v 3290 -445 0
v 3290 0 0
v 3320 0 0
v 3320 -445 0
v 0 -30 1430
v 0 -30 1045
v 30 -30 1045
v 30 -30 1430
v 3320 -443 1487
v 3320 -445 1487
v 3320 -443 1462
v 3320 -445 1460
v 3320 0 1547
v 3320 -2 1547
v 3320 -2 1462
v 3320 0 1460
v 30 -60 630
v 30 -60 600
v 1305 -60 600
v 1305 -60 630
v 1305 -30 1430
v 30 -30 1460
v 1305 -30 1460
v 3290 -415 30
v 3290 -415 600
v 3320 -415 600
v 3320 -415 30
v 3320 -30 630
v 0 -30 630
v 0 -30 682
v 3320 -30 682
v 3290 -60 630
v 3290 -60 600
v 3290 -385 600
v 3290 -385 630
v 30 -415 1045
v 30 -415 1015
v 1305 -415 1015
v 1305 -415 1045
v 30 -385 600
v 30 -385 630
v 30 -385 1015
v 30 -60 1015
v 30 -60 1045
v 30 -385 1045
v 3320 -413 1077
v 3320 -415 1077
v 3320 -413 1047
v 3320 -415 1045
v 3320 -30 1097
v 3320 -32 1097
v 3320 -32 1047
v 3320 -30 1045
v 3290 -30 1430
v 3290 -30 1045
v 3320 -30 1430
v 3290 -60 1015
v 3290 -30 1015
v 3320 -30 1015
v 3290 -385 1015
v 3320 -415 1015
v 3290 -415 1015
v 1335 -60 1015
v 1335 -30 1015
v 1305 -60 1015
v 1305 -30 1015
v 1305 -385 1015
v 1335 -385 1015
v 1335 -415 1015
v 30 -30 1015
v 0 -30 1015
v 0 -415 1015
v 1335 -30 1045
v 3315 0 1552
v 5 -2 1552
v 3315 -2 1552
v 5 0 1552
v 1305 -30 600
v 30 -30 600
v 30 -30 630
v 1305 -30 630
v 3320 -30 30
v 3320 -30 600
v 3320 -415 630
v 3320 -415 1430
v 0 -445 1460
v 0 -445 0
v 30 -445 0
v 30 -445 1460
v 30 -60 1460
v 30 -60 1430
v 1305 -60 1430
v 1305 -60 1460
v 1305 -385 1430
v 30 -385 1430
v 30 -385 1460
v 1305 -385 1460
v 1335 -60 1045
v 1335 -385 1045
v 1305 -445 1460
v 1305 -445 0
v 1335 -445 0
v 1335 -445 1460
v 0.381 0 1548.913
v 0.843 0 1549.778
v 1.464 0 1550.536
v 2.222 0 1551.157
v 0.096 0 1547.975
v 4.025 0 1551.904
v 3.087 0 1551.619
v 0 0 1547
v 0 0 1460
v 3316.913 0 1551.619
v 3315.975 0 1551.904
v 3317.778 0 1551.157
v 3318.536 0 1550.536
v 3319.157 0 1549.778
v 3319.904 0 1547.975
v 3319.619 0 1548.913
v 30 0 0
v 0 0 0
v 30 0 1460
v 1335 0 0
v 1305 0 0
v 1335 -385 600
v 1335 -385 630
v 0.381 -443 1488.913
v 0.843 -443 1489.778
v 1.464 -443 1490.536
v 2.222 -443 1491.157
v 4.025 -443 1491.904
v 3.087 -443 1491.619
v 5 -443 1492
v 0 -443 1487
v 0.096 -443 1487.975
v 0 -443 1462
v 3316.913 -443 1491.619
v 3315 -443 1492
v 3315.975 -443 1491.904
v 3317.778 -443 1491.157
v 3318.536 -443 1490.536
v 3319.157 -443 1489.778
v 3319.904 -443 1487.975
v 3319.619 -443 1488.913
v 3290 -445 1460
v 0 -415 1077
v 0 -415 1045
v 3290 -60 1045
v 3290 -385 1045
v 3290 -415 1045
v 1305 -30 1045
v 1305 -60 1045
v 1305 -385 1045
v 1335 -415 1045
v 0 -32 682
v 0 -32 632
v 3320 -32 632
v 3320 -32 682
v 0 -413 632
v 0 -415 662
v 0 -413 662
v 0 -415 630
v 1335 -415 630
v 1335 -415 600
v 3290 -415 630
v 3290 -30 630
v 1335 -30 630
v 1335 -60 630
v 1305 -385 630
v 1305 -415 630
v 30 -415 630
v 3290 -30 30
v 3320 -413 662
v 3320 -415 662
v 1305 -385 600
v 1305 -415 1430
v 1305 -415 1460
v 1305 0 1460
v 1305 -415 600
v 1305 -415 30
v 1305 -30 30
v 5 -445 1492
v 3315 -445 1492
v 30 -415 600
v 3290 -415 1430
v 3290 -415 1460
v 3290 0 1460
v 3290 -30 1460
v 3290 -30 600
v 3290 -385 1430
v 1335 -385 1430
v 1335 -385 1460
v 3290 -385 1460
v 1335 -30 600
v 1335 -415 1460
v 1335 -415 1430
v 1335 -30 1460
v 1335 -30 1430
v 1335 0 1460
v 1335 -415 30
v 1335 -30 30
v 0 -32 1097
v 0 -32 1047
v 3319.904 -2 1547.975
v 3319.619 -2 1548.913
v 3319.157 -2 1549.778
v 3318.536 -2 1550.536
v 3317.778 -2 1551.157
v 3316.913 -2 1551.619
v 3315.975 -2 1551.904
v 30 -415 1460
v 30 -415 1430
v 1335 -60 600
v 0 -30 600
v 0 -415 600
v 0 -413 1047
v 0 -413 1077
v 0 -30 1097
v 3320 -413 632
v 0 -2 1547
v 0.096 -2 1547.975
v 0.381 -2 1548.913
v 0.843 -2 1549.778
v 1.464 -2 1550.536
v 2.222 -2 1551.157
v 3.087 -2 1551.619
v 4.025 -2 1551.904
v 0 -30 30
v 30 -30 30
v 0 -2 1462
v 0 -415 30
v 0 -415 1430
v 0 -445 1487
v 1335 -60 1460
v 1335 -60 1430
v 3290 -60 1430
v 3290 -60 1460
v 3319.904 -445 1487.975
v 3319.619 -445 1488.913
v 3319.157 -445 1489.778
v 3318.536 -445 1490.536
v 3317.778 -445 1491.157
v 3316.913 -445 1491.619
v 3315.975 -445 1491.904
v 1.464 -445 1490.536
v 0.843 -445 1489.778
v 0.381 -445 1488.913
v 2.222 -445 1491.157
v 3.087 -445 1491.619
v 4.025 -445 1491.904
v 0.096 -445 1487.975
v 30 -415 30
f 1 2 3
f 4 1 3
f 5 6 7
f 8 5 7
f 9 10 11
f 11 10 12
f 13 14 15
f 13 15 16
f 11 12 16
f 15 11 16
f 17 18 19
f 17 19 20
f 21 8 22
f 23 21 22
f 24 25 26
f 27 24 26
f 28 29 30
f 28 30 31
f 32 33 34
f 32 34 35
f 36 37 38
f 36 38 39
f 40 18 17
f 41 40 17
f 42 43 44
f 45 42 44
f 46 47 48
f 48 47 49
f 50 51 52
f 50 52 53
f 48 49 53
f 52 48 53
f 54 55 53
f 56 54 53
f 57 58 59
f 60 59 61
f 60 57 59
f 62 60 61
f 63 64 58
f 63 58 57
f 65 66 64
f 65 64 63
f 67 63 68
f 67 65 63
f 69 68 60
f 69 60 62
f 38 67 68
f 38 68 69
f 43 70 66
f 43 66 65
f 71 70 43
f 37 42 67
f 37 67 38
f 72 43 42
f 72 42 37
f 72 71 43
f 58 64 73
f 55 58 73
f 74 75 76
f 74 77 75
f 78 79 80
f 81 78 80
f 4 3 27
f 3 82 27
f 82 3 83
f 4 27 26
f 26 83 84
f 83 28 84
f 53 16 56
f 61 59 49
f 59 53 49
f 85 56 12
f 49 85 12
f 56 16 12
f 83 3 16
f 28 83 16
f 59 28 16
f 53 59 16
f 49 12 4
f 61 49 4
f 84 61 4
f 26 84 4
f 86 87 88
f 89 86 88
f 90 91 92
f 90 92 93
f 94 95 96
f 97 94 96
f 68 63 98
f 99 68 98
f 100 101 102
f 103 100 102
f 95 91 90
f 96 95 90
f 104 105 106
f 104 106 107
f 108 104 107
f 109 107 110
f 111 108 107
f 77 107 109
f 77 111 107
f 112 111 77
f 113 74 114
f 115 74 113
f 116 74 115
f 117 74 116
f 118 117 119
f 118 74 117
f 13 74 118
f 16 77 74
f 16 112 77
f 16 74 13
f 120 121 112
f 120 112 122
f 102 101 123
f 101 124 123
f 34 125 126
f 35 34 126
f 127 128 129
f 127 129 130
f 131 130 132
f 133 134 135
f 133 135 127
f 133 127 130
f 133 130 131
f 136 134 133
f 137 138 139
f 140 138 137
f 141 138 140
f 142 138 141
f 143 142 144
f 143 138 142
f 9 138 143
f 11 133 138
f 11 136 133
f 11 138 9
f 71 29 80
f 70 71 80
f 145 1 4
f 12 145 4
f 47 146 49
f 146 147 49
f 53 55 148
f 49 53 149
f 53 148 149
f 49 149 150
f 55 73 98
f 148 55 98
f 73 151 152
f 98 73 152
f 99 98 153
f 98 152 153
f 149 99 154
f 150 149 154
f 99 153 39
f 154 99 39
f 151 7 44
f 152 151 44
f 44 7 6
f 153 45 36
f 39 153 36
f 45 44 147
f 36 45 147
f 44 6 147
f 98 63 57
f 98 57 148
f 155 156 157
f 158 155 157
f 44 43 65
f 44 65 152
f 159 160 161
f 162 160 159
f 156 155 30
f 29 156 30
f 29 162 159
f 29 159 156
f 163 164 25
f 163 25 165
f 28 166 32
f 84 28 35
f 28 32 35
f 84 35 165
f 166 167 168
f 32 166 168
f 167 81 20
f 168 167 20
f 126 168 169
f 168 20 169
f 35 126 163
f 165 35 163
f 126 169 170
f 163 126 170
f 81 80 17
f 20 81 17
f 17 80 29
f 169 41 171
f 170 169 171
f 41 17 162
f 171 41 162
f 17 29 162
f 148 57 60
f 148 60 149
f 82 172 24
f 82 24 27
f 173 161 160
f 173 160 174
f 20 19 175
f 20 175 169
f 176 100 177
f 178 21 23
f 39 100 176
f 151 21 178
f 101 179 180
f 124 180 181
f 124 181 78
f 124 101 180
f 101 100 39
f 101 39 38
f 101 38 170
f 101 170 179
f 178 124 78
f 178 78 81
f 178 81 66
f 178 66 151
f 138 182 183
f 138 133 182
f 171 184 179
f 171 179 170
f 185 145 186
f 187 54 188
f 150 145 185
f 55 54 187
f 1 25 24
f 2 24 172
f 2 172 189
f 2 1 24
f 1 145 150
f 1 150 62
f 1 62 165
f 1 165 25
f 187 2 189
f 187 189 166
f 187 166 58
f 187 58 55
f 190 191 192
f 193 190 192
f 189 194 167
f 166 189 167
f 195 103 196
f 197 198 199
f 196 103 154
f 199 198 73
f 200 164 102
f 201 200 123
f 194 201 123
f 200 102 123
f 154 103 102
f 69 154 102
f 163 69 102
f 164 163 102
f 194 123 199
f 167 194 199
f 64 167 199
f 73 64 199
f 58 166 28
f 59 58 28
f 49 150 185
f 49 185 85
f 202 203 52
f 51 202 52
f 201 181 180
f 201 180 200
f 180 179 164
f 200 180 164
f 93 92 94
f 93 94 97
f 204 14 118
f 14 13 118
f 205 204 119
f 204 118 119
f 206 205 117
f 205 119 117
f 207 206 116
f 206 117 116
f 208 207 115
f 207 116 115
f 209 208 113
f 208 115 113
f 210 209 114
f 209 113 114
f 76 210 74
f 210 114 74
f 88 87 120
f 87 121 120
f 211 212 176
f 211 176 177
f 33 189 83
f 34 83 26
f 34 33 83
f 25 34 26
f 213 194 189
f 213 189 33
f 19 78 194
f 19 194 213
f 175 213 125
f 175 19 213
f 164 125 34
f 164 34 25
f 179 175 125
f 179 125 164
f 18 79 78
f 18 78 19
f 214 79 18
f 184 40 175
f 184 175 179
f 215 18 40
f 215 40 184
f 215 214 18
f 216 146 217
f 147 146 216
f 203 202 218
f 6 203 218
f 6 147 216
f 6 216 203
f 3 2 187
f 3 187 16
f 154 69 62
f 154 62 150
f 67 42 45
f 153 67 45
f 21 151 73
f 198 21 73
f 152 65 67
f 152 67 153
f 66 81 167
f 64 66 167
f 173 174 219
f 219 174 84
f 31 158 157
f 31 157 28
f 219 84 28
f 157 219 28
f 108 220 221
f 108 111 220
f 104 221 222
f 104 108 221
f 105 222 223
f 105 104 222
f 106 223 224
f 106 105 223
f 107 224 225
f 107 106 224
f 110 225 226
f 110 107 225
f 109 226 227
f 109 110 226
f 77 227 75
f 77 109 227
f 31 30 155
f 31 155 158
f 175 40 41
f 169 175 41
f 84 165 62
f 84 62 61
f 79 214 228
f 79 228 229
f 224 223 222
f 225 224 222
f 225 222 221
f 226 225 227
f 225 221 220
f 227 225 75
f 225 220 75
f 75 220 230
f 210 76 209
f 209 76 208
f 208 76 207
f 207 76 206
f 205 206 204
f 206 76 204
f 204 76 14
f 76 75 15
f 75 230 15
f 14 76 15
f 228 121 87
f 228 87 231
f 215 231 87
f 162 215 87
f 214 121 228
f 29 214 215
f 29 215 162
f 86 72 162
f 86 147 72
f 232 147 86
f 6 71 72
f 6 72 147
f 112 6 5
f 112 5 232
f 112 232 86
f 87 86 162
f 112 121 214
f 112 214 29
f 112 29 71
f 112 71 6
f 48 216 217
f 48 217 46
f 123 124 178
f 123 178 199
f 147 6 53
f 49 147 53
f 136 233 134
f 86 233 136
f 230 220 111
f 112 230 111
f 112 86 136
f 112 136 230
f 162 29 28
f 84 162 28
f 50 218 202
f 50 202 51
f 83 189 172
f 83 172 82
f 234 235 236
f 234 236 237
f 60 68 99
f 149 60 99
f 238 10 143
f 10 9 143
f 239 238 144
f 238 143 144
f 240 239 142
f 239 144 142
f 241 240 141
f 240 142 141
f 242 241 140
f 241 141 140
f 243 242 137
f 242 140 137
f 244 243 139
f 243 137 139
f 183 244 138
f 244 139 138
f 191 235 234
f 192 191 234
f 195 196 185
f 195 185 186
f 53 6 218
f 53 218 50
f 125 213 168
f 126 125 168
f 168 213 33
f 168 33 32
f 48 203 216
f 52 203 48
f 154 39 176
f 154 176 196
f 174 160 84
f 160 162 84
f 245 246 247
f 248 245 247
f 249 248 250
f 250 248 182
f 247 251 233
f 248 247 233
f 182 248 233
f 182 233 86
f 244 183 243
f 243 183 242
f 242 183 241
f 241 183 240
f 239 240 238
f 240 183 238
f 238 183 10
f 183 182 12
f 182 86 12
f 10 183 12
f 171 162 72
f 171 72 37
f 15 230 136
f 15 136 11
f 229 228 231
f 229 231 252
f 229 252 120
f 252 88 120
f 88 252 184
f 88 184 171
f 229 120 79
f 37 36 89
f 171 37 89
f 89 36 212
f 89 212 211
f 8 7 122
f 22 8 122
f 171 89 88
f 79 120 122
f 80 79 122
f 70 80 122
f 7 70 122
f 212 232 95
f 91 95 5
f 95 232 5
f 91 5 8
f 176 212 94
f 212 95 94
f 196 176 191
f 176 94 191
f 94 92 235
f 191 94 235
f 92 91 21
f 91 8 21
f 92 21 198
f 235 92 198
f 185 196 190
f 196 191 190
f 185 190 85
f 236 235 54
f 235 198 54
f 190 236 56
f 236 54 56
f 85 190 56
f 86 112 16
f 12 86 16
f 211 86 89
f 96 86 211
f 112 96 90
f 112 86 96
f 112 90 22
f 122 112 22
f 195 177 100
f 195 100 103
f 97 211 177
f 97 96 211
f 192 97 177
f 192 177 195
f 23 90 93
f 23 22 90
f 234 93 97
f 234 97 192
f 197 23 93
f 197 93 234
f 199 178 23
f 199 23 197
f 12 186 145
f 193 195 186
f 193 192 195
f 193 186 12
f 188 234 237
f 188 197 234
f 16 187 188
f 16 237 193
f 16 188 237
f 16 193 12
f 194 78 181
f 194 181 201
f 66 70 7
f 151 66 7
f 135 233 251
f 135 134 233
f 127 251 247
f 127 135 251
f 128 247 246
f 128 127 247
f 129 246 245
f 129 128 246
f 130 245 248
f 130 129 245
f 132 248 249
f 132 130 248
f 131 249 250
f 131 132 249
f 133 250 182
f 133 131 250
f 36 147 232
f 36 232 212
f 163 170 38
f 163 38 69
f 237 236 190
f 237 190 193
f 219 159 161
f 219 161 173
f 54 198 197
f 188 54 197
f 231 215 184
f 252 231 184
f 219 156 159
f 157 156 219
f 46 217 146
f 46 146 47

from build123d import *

# Parameters (mm, degrees)
F0_W      = 30
F0_H      = 30
F1_DEPTH  = 1460
F2_W      = 30
F2_H      = 30
F3_DEPTH  = 3320
F4_W      = 30
F4_H      = 30
F5_DEPTH  = 325
F6_W      = 3320
F6_H      = 445
F7_DEPTH  = 2
F8_W      = 3320
F8_H      = 2
F9_DEPTH  = 30
F10_DEPTH = 90
F11_W     = 3320
F11_H     = 385
F12_DEPTH = 2
F13_W     = 3320
F13_H     = 385
F14_DEPTH = 2
F15_W     = 3320
F15_H     = 2
F16_DEPTH = 30
F17_W     = 3320
F17_H     = 2
F18_DEPTH = 30
F19_R     = 5
F20_W     = 30
F20_H     = 30
F21_DEPTH = 385
F22_DEPTH = 50
F23_DEPTH = 50


with BuildPart() as f1:
    # F0 (on Top) → F1 (new body)
    with BuildSketch(Plane.XY):
        with Locations((15, -15)):
            Rectangle(F0_W, F0_H)
    extrude(amount=F1_DEPTH)



with BuildPart() as f1b:
    # F0 (on Top) → F1, piece 2 (new body)
    with BuildSketch(Plane.XY):
        with Locations((1320, -15)):
            Rectangle(F0_W, F0_H)
    extrude(amount=F1_DEPTH)


with BuildPart() as f1c:
    # F0 (on Top) → F1, piece 3 (new body)
    with BuildSketch(Plane.XY):
        with Locations((3305, -15)):
            Rectangle(F0_W, F0_H)
    extrude(amount=F1_DEPTH)


with BuildPart() as f1d:
    # F0 (on Top) → F1, piece 4 (new body)
    with BuildSketch(Plane.XY):
        with Locations((15, -430)):
            Rectangle(F0_W, F0_H)
    extrude(amount=F1_DEPTH)



with BuildPart() as f1e:
    # F0 (on Top) → F1, piece 5 (new body)
    with BuildSketch(Plane.XY):
        with Locations((1320, -430)):
            Rectangle(F0_W, F0_H)
    extrude(amount=F1_DEPTH)


with BuildPart() as f1f:
    # F0 (on Top) → F1, piece 6 (new body)
    with BuildSketch(Plane.XY):
        with Locations((3305, -430)):
            Rectangle(F0_W, F0_H)
    extrude(amount=F1_DEPTH)


with BuildPart() as f1_1:
    add(f1.part)

    add(f1b.part)  # F3 merges F1b

    add(f1c.part)  # F3 merges F1c
    # F2 (on face) → F3 (join)
    with BuildSketch(Plane(origin=(0, 0, 0), x_dir=(0, -1, 0), z_dir=(-1, 0, 0))):
        with Locations((45, 1445)):
            Rectangle(F2_W, F2_H)
        with Locations((45, 1030)):
            Rectangle(F2_W, F2_H)
        with Locations((45, 615)):
            Rectangle(F2_W, F2_H)
    extrude(amount=-F3_DEPTH)



with BuildPart() as f1d_1:
    add(f1d.part)

    add(f1e.part)  # F3#2 merges F1e

    add(f1f.part)  # F3#2 merges F1f
    # F2 (on face) → F3, piece 2 (join)
    with BuildSketch(Plane(origin=(0, 0, 0), x_dir=(0, -1, 0), z_dir=(-1, 0, 0))):
        with Locations((400, 1445)):
            Rectangle(F2_W, F2_H)
        with Locations((400, 1030)):
            Rectangle(F2_W, F2_H)
        with Locations((400, 615)):
            Rectangle(F2_W, F2_H)
    extrude(amount=-F3_DEPTH)


with BuildPart() as f1_2:
    add(f1_1.part)

    add(f1d_1.part)  # F5 merges F1d
    # F4 (on face) → F5 (join, through all)
    with BuildSketch(Plane.XZ.offset(60)):
        with Locations((15, 1445)):
            Rectangle(F4_W, F4_H)
        with Locations((1320, 1445)):
            Rectangle(F4_W, F4_H)
        with Locations((3305, 1445)):
            Rectangle(F4_W, F4_H)
        with Locations((15, 1030)):
            Rectangle(F4_W, F4_H)
        with Locations((3305, 1030)):
            Rectangle(F4_W, F4_H)
        with Locations((1320, 1030)):
            Rectangle(F4_W, F4_H)
        with Locations((15, 615)):
            Rectangle(F4_W, F4_H)
        with Locations((3305, 615)):
            Rectangle(F4_W, F4_H)
        with Locations((1320, 615)):
            Rectangle(F4_W, F4_H)
    extrude(amount=F5_DEPTH)

    # F20 (on face) → F21 (join, through all)
    with BuildSketch(Plane.XZ.offset(30)):
        with Locations((15, 15)):
            Rectangle(F20_W, F20_H)
        with Locations((1320, 15)):
            Rectangle(F20_W, F20_H)
        with Locations((3305, 15)):
            Rectangle(F20_W, F20_H)
    extrude(amount=F21_DEPTH)


with BuildPart() as f7:
    # F6 (on face) → F7 (new body)
    with BuildSketch(Plane.XY.offset(1460)):
        with Locations((1660, -222.5)):
            Rectangle(F6_W, F6_H)
    extrude(amount=F7_DEPTH)

    # F8 (on face) → F9 (join)
    with BuildSketch(Plane.XY.offset(1462)):
        with Locations((1660, -444)):
            Rectangle(F8_W, F8_H)
    extrude(amount=F9_DEPTH)

    # F8 (on face) → F10 (join)
    with BuildSketch(Plane.XY.offset(1462)):
        with Locations((1660, -1)):
            Rectangle(F8_W, F8_H)
    extrude(amount=F10_DEPTH)

    # F19
    f19_edges = [f7.edges().sort_by_distance(p)[0] for p in [
        (0, -444, 1492),
        (3320, -444, 1492),
        (3320, -1, 1552),
        (0, -1, 1552),
    ]]
    fillet(f19_edges, radius=F19_R)


with BuildPart() as f12:
    # F11 (on face) → F12 (new body)
    with BuildSketch(Plane.XY.offset(1045)):
        with Locations((1660, -222.5)):
            Rectangle(F11_W, F11_H)
    extrude(amount=F12_DEPTH)

    # F15 (on face) → F16 (join)
    with BuildSketch(Plane.XY.offset(1047)):
        with Locations((1660, -414)):
            Rectangle(F15_W, F15_H)
    extrude(amount=F16_DEPTH)

    # F15 (on face) → F22 (join)
    with BuildSketch(Plane.XY.offset(1047)):
        with Locations((1660, -31)):
            Rectangle(F15_W, F15_H)
    extrude(amount=F22_DEPTH)


with BuildPart() as f14:
    # F13 (on face) → F14 (new body)
    with BuildSketch(Plane.XY.offset(630)):
        with Locations((1660, -222.5)):
            Rectangle(F13_W, F13_H)
    extrude(amount=F14_DEPTH)

    # F17 (on face) → F18 (join)
    with BuildSketch(Plane.XY.offset(632)):
        with Locations((1660, -414)):
            Rectangle(F17_W, F17_H)
    extrude(amount=F18_DEPTH)

    # F17 (on face) → F23 (join)
    with BuildSketch(Plane.XY.offset(632)):
        with Locations((1660, -31)):
            Rectangle(F17_W, F17_H)
    extrude(amount=F23_DEPTH)


solid = Compound([f1_2.part, f7.part, f12.part, f14.part])
